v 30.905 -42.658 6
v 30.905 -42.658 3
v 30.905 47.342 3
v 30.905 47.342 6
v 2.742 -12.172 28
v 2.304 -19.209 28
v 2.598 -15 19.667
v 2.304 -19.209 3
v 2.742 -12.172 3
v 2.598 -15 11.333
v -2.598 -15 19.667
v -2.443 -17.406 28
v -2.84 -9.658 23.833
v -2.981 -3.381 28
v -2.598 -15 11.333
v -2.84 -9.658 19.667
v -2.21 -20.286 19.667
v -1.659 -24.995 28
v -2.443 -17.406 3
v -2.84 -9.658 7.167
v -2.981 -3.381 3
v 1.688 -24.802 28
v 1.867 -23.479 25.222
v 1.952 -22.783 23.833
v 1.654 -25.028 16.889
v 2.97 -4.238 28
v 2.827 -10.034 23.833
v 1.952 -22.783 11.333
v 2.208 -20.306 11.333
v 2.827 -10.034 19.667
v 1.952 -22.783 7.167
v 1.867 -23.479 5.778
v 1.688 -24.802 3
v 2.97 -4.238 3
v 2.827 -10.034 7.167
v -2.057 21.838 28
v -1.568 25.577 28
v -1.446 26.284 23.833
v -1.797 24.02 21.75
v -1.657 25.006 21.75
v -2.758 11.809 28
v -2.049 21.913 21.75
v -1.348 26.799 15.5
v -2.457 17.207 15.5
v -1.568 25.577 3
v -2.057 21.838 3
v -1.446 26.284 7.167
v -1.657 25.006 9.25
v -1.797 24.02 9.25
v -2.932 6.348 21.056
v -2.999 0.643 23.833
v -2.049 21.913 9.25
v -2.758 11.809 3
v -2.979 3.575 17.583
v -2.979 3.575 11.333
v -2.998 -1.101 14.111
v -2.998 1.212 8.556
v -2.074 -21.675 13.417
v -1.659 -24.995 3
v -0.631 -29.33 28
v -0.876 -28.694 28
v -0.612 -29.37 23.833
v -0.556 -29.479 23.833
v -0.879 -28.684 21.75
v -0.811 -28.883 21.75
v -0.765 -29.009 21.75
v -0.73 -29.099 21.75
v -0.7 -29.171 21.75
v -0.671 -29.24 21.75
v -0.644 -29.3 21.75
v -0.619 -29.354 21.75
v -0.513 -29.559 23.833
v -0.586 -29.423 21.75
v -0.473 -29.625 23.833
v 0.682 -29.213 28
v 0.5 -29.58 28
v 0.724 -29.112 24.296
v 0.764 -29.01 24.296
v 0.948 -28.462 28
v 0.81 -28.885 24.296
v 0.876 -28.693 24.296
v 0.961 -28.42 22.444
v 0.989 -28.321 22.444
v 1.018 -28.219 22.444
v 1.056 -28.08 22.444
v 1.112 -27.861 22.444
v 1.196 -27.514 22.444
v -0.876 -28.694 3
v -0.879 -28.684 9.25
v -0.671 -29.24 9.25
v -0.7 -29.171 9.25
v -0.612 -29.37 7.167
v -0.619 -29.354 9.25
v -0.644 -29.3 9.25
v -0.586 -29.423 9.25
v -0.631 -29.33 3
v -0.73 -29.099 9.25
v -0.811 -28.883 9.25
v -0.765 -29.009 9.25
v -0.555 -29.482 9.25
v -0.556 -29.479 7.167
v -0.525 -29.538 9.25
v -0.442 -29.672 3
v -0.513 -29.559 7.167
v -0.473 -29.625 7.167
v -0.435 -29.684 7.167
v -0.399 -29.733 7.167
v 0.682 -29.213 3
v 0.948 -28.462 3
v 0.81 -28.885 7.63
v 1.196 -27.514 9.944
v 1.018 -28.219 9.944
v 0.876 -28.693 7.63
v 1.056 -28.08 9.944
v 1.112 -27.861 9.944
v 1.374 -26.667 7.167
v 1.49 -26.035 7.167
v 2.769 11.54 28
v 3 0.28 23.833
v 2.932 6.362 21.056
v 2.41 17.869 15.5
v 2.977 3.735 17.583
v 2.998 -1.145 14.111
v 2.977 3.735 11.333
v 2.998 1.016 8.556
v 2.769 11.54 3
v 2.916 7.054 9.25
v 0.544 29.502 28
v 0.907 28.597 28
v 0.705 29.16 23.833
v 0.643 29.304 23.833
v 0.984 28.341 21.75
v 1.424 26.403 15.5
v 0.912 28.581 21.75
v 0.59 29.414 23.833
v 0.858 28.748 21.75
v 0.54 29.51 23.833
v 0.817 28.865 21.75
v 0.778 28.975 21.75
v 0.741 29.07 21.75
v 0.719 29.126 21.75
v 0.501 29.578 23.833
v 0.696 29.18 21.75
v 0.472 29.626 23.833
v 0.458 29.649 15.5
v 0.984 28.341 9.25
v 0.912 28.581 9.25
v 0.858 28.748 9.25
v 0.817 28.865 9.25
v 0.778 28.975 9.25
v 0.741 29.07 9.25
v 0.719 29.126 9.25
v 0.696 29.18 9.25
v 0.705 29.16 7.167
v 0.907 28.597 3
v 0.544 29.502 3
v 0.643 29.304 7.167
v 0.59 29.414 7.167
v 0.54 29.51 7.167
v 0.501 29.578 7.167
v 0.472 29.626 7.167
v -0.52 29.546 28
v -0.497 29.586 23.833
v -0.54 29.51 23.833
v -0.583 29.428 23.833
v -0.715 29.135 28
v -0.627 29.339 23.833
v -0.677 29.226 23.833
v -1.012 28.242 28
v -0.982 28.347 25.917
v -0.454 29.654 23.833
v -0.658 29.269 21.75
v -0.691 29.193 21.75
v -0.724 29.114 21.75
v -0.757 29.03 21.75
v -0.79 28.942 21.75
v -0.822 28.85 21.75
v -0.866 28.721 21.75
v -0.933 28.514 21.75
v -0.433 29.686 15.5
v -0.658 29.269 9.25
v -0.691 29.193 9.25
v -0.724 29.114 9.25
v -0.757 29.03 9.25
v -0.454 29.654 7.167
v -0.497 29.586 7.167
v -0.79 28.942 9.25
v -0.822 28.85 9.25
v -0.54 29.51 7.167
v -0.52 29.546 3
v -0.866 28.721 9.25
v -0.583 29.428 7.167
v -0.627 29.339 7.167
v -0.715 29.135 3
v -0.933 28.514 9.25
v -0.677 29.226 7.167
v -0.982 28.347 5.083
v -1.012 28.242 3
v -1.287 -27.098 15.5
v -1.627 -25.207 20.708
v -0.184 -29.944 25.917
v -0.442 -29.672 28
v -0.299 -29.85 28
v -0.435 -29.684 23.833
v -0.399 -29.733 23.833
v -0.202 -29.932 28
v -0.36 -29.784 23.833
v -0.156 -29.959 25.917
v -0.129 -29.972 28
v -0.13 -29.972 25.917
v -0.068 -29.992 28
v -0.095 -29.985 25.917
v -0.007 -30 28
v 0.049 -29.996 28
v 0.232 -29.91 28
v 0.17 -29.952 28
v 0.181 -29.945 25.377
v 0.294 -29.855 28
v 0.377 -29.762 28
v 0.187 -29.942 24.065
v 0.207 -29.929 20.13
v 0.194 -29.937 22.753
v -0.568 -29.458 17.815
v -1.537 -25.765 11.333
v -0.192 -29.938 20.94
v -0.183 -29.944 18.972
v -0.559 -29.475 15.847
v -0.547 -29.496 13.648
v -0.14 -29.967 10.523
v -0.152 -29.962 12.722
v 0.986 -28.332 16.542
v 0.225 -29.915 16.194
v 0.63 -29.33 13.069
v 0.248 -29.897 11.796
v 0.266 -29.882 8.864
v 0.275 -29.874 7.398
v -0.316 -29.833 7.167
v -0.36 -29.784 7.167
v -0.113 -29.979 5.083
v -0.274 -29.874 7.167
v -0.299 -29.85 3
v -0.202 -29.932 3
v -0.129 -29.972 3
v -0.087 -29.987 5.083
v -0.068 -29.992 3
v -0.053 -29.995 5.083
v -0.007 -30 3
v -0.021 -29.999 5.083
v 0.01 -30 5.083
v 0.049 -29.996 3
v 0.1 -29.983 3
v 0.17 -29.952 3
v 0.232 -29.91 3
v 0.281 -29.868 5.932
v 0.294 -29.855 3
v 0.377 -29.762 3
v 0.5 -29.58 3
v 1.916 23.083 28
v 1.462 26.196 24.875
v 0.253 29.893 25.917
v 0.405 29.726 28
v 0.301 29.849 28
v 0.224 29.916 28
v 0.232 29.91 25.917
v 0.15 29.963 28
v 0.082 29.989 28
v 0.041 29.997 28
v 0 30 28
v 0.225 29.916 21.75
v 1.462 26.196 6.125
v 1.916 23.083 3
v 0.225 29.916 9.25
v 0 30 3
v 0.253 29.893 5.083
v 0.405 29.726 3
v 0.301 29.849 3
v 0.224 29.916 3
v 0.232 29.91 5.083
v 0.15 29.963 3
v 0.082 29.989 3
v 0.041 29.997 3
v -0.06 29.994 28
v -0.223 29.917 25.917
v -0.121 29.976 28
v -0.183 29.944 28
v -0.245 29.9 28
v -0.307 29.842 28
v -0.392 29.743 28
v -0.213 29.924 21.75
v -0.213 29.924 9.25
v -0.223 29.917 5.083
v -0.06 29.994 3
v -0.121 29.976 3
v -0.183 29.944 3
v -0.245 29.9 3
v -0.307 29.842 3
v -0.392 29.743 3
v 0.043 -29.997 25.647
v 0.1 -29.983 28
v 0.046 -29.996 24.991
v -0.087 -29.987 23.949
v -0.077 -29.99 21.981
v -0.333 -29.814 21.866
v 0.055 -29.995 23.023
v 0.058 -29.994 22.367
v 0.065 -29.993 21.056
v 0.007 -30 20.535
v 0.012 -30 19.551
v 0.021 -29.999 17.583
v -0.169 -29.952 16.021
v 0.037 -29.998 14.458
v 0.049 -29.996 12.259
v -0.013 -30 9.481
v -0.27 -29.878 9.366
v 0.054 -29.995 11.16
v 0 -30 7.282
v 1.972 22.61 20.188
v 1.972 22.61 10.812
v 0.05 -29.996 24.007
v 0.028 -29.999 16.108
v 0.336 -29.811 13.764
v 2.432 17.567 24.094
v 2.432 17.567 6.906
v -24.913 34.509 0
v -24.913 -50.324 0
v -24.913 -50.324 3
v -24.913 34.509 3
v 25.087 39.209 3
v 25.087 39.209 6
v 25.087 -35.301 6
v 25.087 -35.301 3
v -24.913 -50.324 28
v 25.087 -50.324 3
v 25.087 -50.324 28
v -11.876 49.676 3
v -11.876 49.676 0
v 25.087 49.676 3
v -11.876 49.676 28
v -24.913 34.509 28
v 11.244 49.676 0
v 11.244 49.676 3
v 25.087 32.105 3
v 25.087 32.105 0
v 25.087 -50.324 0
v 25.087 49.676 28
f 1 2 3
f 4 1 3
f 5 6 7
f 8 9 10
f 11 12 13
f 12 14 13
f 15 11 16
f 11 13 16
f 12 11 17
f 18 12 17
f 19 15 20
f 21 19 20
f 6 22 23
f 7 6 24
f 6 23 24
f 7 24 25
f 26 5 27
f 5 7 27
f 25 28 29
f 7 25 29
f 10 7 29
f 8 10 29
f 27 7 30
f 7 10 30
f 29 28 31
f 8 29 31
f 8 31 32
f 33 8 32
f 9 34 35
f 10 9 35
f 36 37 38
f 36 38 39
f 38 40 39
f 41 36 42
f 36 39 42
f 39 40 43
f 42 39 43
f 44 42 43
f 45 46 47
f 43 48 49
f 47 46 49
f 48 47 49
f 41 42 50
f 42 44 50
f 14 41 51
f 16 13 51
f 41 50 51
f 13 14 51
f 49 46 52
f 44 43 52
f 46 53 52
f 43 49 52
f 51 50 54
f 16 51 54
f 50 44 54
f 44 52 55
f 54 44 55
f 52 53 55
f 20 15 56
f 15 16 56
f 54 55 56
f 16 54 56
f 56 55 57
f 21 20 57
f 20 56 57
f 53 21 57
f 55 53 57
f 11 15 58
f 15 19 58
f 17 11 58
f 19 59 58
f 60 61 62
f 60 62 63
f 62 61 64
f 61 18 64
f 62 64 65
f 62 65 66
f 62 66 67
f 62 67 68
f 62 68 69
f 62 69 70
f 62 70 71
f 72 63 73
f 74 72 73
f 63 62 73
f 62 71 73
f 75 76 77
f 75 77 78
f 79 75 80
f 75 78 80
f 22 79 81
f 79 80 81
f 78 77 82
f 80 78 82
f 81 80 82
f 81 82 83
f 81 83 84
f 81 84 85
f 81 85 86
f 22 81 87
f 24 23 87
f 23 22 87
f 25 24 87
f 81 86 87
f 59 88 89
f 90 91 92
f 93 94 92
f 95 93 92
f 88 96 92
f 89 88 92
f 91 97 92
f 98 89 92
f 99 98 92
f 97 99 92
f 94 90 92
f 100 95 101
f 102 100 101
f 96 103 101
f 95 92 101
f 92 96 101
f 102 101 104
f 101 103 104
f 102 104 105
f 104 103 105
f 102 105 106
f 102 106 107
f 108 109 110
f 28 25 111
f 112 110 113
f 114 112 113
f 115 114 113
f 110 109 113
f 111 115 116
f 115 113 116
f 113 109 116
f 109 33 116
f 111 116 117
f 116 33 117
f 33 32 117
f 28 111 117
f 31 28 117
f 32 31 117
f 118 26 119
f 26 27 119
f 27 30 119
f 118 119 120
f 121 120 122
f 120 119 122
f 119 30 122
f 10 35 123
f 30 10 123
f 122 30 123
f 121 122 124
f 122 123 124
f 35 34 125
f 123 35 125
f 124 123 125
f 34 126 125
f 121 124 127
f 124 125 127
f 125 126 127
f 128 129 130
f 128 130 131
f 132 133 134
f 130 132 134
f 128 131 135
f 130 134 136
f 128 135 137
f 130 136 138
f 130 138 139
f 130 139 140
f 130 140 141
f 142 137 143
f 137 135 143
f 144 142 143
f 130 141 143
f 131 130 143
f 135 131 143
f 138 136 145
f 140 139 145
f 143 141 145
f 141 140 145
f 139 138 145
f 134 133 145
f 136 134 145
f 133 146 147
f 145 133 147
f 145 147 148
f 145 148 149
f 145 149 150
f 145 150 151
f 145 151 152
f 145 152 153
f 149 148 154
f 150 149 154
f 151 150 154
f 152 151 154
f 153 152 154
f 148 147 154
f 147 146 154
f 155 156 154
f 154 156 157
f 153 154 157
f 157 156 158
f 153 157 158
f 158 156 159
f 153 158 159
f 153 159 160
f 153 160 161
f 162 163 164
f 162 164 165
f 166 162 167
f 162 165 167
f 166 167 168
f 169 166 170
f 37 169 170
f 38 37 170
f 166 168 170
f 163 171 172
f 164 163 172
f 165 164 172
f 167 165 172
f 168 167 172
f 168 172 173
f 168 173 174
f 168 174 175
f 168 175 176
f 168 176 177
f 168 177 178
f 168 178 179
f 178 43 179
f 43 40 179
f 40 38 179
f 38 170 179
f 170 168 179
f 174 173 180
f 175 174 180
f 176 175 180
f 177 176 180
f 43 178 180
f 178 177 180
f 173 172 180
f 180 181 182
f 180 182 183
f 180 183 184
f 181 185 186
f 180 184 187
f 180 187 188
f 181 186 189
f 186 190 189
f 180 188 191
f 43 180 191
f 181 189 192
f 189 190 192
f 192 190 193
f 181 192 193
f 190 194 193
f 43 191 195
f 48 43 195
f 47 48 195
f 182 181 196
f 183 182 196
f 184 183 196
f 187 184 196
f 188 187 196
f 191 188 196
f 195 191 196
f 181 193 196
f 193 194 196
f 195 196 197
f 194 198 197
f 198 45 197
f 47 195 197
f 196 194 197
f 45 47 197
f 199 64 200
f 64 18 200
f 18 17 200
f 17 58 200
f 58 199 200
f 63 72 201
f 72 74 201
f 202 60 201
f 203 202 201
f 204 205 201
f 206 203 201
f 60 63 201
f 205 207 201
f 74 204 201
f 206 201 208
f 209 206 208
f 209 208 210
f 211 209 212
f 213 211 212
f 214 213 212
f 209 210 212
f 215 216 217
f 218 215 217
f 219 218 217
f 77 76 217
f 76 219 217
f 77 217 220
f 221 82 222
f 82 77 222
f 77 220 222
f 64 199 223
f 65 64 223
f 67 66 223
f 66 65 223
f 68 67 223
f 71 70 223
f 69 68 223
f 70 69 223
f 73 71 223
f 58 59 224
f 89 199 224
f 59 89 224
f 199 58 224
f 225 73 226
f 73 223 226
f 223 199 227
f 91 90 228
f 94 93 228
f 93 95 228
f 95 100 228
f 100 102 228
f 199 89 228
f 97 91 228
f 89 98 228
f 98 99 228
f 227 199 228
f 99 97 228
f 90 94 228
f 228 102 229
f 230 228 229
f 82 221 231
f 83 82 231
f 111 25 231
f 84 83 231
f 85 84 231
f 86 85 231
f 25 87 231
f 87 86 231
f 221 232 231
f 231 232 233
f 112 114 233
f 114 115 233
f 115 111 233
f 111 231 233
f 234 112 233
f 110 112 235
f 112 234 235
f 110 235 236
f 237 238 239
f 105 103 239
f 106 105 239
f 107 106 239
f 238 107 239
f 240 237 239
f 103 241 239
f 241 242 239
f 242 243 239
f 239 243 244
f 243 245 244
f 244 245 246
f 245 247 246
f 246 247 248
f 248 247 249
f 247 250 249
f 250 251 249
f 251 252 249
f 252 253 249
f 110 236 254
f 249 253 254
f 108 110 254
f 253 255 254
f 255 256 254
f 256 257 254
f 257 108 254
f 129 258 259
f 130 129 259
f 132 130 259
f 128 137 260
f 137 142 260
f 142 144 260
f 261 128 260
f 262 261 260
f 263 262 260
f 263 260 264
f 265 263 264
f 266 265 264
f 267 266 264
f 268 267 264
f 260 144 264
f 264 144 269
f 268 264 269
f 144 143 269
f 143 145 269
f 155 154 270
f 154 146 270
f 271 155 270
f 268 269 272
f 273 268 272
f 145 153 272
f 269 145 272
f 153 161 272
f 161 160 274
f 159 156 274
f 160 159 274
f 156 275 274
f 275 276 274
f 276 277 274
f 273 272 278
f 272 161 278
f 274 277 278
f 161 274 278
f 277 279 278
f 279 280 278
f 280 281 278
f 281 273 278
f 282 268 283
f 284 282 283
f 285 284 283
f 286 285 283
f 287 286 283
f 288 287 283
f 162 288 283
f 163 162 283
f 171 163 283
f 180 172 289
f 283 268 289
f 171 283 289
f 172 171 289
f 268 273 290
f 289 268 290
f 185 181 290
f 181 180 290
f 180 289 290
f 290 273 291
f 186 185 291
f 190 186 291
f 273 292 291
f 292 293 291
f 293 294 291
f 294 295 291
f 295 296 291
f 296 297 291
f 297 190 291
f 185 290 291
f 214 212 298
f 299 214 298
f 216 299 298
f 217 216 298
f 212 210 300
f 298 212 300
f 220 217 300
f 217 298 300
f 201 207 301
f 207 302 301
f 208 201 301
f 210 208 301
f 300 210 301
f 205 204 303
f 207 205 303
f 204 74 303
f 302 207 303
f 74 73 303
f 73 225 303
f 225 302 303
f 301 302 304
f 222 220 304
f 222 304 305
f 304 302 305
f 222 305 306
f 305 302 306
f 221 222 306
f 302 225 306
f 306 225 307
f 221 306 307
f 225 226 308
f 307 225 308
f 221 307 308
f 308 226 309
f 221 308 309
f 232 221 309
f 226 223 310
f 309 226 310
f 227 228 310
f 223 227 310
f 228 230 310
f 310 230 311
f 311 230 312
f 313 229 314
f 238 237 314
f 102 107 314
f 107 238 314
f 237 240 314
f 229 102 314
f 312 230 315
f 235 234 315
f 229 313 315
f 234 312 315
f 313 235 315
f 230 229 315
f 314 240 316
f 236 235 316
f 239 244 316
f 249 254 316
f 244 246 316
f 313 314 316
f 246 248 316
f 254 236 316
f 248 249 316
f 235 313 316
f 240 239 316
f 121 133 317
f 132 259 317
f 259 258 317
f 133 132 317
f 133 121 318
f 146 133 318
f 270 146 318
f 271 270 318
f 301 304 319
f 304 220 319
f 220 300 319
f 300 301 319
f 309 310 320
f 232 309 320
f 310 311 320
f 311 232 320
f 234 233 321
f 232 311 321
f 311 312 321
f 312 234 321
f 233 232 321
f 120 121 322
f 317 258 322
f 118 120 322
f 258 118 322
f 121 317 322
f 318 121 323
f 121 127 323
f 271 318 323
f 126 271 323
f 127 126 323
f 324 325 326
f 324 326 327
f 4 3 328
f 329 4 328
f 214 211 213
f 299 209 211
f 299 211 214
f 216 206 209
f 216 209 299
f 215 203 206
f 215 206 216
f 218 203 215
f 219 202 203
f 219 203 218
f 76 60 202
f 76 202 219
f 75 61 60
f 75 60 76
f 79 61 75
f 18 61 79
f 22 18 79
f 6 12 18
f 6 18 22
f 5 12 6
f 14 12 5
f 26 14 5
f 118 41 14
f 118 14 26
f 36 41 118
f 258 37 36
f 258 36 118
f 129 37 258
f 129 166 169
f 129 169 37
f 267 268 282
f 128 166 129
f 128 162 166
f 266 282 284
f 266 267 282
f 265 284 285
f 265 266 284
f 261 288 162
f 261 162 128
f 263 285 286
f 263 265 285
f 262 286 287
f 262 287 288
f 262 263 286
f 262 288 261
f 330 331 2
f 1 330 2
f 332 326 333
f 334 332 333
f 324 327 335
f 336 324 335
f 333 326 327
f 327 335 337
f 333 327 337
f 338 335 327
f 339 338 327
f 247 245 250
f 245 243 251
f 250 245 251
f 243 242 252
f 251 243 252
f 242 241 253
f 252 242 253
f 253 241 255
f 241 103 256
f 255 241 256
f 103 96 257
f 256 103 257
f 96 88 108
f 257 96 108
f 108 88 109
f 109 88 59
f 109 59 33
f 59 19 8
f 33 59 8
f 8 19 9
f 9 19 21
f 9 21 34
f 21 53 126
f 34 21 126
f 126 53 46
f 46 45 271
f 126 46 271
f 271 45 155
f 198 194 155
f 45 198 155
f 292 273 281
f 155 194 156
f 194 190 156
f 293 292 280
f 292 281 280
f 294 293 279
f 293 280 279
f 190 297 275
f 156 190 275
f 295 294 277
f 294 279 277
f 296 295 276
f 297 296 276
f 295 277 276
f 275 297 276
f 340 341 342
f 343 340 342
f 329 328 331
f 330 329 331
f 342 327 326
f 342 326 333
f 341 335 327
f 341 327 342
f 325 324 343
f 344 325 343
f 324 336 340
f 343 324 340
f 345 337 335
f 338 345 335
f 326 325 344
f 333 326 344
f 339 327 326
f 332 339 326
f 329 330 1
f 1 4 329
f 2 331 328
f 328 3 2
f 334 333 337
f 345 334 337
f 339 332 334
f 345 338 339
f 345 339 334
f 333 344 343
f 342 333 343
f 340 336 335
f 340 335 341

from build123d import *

# Parameters (mm, degrees)
F0_W      = 50
F0_H      = 100
F1_DEPTH  = 3
F3_DEPTH  = 3
F6_DEPTH  = 3
F8_DEPTH  = 25
F12_DEPTH = 25


# Not quite as in the source:
# - a feature of the source that left no trace in its solid (it failed there, or was rolled back) is left out


with BuildPart() as f1:
    # F0 (on Top) → F1 (new body)
    with BuildSketch(Plane.XY):
        with Locations((0.0869164988, -0.3243560148)):
            Rectangle(F0_W, F0_H)
    extrude(amount=F1_DEPTH)

    # F4 (on face) → F6 (cut)
    with BuildSketch(Plane.XY.offset(3)):
        Polygon((-24.9130835012, 49.6756439852), (-24.9130835012, 34.5086446194), (-11.8761310107, 49.6756439852), align=None)
    extrude(amount=-F6_DEPTH, mode=Mode.SUBTRACT)

    # F7 (on face) → F8 (cut)
    with BuildSketch(Plane.XY.offset(3)):
        Polygon((25.0869164988, 49.6756439852), (11.2441298249, 49.6756439852), (25.0869164988, 32.1048707049), align=None)
    extrude(amount=-F8_DEPTH, mode=Mode.SUBTRACT)


with BuildPart() as f3:
    # F2 (on face) → F3 (new body)
    with BuildSketch(Plane.XY.offset(3)):
        Polygon((30.9052136403, 47.3424089814), (25.0869164988, 39.2093026638), (25.0869164988, -35.3014330966), (30.9052136403, -42.6575910186), align=None)
    extrude(amount=F3_DEPTH)


with BuildPart() as f12:
    # F10 (on face) → F12 (new body)
    with BuildSketch(Plane.XY.offset(3)):
        with BuildLine():
            add(Edge.make_bspline(
                [(0, 30), (-5.1961524227, 30), (-2.5980762114, -15), (0, -60), (2.5980762114, -15), (5.1961524227, 30), (0, 30)],
                knots=[0, 0, 0, 2.0943951024, 2.0943951024, 4.1887902048, 4.1887902048, 6.2831853072, 6.2831853072, 6.2831853072], degree=2, weights=[1, 0.5, 1, 0.5, 1, 0.5, 1]))
        make_face()
    extrude(amount=F12_DEPTH)


with BuildPart() as f12b:
    # F9 (on face) → F12, piece 2 (new body)
    with BuildSketch(Plane.XY.offset(3)):
        Polygon((25.0869164988, -50.3243560148), (25.0869164988, 49.6756439852), (-11.8761310107, 49.6756439852), (-24.9130835012, 34.5086446194), (-24.9130835012, -50.3243560148), align=None)
    extrude(amount=F12_DEPTH)


solid = Compound([f1.part, f3.part, f12.part, f12b.part])
